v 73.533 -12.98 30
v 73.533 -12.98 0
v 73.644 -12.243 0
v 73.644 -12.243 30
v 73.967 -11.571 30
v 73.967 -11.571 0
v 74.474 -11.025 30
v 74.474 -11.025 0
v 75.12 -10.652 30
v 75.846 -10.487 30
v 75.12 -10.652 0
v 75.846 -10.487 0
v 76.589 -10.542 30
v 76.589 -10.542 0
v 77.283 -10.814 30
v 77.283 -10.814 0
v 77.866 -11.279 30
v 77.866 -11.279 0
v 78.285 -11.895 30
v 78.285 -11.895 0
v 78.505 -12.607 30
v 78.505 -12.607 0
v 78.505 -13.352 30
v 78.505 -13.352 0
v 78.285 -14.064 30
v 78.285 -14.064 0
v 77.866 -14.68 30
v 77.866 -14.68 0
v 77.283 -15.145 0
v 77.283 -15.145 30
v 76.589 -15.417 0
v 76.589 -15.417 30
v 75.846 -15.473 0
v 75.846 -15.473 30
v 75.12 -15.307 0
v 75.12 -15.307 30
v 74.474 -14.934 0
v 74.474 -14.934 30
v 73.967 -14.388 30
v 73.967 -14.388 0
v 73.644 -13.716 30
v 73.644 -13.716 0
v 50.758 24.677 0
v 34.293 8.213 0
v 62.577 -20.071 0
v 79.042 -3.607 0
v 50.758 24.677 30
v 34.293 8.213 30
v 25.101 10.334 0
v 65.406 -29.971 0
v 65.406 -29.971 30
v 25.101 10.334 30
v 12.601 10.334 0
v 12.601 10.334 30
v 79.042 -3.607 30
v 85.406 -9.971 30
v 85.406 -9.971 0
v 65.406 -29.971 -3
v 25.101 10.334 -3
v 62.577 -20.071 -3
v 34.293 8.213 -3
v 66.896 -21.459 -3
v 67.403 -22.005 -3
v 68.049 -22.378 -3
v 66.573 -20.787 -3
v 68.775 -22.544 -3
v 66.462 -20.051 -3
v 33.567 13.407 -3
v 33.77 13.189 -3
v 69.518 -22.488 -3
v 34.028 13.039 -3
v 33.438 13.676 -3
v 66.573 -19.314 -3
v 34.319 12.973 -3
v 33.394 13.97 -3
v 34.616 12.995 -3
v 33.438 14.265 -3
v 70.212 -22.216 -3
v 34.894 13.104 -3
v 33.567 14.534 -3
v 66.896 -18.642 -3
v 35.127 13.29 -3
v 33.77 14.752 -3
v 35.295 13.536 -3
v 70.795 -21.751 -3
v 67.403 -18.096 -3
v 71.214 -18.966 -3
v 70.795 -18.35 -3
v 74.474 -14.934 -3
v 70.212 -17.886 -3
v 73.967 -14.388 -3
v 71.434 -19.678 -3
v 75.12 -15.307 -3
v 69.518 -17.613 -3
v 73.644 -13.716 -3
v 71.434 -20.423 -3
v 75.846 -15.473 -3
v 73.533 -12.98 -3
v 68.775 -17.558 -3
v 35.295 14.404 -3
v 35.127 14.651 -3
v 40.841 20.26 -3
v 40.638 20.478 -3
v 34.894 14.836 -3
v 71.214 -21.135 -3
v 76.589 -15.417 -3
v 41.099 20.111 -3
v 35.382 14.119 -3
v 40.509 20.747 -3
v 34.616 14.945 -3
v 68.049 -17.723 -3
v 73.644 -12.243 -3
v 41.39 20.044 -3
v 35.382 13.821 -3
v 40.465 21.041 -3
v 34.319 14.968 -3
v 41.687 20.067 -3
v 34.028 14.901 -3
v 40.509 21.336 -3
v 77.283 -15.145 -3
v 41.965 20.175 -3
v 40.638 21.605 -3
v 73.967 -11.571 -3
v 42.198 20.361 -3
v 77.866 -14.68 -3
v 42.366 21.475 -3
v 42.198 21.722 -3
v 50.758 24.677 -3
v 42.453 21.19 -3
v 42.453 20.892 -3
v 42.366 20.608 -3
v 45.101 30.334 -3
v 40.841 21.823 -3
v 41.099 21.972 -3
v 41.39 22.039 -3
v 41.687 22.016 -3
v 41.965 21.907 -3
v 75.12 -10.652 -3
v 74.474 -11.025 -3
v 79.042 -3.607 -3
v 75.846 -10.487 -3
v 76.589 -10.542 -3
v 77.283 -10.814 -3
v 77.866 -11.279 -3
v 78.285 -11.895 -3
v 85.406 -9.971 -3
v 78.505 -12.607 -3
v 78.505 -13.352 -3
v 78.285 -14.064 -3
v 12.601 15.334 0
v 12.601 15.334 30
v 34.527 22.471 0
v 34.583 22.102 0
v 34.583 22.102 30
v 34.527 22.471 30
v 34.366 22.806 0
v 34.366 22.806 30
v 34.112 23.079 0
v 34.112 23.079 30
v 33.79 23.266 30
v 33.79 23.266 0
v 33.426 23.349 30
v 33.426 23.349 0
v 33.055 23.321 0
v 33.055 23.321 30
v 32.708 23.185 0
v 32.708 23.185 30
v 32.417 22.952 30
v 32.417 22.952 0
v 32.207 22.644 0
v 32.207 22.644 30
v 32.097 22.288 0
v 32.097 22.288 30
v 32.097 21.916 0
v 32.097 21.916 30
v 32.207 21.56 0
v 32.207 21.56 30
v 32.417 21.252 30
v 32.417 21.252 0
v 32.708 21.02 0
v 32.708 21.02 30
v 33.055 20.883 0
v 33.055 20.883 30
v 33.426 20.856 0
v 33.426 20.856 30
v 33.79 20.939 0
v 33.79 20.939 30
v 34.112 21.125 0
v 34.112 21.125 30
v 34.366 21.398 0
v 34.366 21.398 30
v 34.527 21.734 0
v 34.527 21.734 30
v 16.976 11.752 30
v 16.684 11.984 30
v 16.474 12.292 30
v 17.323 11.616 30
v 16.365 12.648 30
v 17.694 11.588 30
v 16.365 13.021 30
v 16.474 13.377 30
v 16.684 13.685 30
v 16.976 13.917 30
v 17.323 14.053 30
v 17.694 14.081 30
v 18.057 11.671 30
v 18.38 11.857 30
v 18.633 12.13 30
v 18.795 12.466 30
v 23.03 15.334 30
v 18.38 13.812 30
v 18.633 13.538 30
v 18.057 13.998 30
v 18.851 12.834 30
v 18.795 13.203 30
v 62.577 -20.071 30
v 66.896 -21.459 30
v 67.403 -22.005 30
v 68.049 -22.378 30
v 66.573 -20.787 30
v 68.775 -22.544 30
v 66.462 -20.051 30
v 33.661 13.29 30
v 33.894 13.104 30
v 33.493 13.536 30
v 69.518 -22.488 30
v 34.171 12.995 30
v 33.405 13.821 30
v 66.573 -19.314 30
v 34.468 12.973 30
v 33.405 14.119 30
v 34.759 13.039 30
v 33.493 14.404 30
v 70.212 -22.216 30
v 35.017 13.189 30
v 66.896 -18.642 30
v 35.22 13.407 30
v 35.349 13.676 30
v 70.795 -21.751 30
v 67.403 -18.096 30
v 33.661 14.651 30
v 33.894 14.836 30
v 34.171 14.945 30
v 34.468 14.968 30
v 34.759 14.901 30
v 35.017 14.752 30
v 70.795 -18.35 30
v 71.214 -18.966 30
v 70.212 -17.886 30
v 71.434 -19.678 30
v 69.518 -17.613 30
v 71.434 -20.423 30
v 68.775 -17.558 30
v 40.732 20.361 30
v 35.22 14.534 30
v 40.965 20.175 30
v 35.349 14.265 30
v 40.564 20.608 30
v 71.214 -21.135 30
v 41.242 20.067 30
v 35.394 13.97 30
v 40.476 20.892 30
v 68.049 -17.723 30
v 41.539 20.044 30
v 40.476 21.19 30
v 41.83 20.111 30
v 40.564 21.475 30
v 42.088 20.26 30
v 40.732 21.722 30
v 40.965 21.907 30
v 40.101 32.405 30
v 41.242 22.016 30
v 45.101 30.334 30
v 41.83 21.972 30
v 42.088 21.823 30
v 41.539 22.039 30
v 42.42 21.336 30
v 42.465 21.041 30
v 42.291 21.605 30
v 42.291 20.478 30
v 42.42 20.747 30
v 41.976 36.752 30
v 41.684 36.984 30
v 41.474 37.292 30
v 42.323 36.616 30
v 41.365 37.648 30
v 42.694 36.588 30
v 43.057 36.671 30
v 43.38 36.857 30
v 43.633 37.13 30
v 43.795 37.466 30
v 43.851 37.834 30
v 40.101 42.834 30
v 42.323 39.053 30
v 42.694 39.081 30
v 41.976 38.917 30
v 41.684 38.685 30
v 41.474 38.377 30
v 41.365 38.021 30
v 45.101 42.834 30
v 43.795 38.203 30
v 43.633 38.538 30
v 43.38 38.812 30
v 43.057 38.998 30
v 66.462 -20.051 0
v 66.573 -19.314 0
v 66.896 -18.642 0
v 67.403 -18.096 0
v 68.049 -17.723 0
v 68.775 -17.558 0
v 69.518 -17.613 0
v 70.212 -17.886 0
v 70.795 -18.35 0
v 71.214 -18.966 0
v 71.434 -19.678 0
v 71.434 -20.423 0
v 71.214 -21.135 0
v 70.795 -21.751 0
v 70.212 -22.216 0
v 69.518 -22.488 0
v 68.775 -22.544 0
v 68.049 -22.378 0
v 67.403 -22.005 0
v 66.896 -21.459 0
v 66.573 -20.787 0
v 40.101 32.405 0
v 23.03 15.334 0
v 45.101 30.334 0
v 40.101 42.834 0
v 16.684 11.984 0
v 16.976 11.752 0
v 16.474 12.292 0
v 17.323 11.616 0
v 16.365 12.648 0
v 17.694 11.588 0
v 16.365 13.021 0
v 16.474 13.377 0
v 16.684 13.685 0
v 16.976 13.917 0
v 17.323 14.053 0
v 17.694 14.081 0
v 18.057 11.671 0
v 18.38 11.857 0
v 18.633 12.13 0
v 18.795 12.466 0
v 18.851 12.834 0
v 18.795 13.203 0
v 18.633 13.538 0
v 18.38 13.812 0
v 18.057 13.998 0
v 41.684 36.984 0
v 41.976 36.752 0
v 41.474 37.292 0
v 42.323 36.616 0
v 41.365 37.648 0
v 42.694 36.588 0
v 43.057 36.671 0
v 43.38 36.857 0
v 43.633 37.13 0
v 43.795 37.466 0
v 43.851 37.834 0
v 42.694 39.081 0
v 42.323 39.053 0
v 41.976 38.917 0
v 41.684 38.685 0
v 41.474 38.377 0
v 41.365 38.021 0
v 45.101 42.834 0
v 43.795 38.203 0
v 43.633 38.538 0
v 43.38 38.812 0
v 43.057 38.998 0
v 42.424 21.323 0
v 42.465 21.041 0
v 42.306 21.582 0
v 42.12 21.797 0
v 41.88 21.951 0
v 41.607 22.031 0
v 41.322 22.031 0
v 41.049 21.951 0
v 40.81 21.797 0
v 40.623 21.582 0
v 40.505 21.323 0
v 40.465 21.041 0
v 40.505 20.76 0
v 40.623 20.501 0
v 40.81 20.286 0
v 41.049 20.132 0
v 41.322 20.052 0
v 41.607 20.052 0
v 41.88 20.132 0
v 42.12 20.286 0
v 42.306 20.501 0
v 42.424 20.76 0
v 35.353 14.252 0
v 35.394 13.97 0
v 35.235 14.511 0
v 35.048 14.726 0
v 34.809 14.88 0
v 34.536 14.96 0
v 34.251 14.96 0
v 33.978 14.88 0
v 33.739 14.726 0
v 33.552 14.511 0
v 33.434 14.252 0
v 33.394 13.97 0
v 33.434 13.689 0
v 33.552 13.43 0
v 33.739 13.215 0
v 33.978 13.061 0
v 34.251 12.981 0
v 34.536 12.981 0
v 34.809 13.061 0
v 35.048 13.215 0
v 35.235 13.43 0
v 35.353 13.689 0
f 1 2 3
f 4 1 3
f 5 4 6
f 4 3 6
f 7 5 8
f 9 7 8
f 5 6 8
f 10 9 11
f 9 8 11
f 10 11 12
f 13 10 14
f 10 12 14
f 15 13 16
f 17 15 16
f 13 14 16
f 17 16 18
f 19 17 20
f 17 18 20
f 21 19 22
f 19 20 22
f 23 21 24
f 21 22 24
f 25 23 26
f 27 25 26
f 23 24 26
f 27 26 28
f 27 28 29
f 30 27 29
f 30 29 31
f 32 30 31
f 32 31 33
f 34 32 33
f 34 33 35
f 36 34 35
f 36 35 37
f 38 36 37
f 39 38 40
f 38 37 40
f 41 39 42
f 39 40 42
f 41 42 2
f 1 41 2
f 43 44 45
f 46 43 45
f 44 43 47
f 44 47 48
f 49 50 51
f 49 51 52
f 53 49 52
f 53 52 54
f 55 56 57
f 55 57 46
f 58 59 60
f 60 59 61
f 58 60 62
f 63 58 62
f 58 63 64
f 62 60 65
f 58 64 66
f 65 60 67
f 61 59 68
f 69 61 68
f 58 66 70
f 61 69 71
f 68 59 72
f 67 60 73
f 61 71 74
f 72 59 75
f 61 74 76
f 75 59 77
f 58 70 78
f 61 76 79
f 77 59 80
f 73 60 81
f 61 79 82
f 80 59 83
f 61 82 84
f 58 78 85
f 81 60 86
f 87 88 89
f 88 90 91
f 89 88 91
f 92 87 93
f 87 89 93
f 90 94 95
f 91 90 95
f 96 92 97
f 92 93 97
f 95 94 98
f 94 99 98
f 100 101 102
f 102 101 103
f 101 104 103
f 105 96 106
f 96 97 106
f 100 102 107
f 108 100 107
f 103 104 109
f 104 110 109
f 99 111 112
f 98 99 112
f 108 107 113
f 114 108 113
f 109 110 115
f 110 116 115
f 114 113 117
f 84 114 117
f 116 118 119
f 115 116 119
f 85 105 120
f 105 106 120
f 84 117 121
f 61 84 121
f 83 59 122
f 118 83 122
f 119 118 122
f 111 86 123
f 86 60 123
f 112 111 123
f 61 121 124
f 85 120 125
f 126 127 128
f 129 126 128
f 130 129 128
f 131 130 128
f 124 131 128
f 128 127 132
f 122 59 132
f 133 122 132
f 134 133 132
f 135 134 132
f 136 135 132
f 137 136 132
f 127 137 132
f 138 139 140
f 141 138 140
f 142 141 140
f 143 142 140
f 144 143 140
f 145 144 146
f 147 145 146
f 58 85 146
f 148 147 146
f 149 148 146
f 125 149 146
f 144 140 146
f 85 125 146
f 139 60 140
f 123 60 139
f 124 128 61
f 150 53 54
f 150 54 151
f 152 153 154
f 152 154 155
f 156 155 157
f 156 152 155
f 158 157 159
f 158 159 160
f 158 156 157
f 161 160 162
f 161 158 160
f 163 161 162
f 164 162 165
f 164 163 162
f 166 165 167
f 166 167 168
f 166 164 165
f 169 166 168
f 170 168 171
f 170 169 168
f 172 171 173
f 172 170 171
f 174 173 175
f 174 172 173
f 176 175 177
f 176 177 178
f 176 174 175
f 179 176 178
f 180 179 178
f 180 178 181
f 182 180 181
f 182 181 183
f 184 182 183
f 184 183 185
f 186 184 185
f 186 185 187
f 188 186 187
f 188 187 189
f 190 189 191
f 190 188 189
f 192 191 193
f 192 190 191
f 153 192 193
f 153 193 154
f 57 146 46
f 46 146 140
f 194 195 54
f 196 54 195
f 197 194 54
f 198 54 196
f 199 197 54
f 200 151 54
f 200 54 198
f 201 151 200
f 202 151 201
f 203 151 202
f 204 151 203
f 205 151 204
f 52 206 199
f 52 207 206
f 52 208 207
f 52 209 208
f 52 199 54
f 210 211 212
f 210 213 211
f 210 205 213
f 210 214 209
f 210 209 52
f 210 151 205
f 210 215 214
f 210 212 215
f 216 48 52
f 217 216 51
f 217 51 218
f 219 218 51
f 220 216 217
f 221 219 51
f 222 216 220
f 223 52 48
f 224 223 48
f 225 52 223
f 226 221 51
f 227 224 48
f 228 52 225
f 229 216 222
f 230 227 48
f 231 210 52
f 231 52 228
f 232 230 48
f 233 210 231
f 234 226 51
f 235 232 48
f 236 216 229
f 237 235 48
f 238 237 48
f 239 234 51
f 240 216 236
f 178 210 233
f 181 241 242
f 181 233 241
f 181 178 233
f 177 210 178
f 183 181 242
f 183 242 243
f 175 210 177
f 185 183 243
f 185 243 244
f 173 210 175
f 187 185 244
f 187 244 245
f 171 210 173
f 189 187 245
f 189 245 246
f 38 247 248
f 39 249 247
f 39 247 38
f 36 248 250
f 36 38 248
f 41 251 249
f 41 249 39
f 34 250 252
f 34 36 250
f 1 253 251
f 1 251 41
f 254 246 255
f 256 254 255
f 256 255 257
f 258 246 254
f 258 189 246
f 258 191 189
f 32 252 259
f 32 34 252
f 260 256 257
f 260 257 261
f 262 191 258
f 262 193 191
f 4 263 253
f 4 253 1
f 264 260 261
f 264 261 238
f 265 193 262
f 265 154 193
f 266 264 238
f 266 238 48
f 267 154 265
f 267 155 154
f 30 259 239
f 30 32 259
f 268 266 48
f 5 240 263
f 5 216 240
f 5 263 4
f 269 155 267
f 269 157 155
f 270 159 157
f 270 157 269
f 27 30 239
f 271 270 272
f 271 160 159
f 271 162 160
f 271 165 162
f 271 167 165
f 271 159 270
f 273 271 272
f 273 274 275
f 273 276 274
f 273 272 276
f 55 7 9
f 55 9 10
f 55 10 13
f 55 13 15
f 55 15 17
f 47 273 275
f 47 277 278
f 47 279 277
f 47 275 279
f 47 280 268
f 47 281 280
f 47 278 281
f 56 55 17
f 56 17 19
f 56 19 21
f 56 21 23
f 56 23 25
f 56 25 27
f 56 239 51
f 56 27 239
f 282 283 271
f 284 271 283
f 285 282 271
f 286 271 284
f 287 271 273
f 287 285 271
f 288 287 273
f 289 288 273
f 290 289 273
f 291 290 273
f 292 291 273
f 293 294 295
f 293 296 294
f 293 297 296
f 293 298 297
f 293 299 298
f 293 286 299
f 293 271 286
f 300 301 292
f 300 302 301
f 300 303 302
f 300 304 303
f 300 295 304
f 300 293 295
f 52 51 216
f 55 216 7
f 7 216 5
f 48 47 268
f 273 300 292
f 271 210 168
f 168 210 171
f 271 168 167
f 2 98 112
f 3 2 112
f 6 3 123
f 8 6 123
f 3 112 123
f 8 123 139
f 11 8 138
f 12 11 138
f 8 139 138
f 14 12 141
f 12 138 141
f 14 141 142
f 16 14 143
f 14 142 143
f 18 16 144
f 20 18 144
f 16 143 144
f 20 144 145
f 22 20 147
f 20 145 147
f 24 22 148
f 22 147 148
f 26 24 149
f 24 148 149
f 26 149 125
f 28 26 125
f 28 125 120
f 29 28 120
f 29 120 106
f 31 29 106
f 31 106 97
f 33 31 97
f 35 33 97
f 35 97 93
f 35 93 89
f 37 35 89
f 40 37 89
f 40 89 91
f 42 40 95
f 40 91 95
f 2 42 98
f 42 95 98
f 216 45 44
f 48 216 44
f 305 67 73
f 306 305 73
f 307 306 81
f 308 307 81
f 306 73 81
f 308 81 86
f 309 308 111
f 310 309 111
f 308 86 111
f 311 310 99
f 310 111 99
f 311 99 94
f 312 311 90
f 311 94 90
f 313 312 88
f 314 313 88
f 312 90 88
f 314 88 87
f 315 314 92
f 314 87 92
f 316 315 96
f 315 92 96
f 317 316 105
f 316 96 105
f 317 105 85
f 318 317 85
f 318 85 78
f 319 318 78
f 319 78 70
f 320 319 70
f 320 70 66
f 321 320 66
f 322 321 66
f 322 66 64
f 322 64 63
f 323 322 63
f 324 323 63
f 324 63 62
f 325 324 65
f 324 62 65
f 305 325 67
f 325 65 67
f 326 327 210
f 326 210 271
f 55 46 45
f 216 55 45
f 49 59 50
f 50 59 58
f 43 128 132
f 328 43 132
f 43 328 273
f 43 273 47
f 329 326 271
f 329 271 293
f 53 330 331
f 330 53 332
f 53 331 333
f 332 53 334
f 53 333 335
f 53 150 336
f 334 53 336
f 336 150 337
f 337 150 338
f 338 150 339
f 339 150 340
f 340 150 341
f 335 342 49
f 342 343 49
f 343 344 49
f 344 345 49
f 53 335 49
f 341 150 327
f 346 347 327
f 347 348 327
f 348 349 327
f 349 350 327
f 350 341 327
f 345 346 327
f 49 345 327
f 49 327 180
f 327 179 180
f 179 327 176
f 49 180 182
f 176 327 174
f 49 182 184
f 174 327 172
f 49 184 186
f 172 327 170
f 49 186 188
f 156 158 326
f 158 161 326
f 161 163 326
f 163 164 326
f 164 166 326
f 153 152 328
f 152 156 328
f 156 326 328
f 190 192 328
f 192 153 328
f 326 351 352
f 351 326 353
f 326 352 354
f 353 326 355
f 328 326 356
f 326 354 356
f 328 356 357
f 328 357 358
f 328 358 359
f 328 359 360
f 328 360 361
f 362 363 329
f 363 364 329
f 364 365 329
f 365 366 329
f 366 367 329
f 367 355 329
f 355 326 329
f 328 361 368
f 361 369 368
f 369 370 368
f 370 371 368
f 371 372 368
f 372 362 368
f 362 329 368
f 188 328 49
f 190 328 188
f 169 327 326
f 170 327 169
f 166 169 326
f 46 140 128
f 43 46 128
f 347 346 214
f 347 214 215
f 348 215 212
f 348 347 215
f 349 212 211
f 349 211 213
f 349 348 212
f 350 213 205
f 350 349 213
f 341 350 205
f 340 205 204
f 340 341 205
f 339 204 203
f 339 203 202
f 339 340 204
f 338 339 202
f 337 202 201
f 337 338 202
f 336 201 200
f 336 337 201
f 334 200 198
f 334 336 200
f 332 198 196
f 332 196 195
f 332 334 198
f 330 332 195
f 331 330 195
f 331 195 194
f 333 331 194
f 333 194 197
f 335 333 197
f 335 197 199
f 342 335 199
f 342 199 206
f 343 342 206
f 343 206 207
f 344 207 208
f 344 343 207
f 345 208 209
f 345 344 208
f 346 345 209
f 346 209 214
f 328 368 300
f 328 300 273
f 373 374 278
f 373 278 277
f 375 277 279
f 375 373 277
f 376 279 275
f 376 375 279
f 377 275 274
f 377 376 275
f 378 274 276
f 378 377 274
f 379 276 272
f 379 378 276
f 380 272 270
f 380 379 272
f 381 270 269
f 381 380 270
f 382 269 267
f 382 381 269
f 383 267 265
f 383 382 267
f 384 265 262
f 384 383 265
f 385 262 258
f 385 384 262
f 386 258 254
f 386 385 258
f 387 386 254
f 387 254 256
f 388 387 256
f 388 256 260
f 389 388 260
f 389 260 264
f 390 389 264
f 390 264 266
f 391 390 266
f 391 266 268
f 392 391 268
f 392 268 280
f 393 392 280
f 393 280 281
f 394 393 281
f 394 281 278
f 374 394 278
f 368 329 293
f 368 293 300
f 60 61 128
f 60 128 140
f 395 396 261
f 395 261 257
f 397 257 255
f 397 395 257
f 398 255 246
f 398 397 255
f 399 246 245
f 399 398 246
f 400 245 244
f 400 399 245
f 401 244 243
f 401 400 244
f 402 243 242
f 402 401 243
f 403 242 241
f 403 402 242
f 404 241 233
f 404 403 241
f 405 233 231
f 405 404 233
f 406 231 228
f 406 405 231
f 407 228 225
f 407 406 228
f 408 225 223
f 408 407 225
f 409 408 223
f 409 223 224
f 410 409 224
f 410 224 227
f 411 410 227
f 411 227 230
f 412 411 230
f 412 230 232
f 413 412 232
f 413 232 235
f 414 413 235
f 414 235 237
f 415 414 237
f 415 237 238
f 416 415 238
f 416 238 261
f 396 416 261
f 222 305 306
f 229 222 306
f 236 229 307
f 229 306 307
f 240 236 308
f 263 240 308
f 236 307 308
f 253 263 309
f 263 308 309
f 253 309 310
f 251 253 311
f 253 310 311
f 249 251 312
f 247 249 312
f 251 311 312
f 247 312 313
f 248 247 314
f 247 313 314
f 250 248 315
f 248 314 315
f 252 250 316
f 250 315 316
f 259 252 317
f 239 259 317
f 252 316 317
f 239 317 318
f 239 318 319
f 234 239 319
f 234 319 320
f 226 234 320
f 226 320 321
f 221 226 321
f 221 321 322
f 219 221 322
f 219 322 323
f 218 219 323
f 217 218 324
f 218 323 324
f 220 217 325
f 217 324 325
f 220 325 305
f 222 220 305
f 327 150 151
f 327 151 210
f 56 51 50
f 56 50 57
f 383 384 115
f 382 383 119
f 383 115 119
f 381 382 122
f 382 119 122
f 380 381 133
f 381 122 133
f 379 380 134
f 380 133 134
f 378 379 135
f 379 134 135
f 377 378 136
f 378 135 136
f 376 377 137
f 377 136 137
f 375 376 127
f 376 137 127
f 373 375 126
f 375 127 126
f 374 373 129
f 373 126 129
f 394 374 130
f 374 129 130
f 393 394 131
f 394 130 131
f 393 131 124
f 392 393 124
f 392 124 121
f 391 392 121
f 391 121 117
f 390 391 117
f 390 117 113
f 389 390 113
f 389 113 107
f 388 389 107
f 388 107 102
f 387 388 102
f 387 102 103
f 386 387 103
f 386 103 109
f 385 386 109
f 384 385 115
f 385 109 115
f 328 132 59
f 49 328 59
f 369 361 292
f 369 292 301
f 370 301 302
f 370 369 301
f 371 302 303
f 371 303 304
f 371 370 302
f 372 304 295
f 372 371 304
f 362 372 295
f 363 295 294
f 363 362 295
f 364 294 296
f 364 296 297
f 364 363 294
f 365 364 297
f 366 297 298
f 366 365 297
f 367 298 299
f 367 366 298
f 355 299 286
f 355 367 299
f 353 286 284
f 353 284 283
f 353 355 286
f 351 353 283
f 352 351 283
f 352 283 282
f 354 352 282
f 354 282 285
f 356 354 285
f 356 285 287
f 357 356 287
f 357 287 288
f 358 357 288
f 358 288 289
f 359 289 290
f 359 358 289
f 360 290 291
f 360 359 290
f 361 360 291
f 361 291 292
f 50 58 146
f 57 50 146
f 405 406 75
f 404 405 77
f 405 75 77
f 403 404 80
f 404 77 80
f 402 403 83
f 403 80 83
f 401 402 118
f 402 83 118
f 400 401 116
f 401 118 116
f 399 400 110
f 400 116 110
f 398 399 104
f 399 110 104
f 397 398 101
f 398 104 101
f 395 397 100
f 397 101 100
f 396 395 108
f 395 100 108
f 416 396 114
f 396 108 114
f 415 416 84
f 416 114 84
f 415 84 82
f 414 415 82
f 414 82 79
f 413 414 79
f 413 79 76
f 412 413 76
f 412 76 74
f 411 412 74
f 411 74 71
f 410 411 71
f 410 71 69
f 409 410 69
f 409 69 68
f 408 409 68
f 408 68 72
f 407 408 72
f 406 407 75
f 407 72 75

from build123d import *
from build123d.topology import SkipClean

# Parameters (mm, degrees)
MODEL_R             = 1
MODEL_R_2           = 1.25
BOSS_EXTRUDE1_DEPTH = 30
SKETCH3_R           = 2.5
BOSS_EXTRUDE2_DEPTH = 30
BOSS_EXTRUDE5_START = 3
SKETCH7_R           = 2.5
SKETCH7_R_2         = 1
BOSS_EXTRUDE5_DEPTH = 3
BOSS_EXTRUDE6_DEPTH = 3


with BuildPart() as part:
    # Model → Boss-Extrude1 (new body)
    # profile 1 of 2: a face of its own
    with BuildSketch(Plane.XY):
        Polygon((25.100694962, 10.3343272), (45.100694962, 30.3343272), (50.757549212, 24.67747295), (30.757549212, 4.67747295), align=None)
        with Locations((41.464655993, 21.041433981)):
            Circle(MODEL_R, mode=Mode.SUBTRACT)
        with Locations((34.393588181, 13.970366169)):
            Circle(MODEL_R, mode=Mode.SUBTRACT)
    # profile 2 of 2: a face of its own
    with BuildSketch(Plane.XY):
        Polygon((40.100694962, 42.8343272), (45.100694962, 42.8343272), (45.100694962, 30.3343272), (25.100694962, 10.3343272), (12.600694962, 10.3343272), (12.600694962, 15.3343272), (23.02962715, 15.3343272), (40.100694962, 32.405395011), align=None)
        with Locations((33.332928009, 22.102094153)):
            Circle(MODEL_R_2, mode=Mode.SUBTRACT)
        with Locations((42.600694962, 37.8343272)):
            Circle(MODEL_R_2, mode=Mode.SUBTRACT)
        with Locations((17.600694962, 12.8343272)):
            Circle(MODEL_R_2, mode=Mode.SUBTRACT)
    extrude(amount=BOSS_EXTRUDE1_DEPTH)

    # Sketch3 → Boss-Extrude2 (add)
    with BuildSketch(Plane(origin=(0, 0, 0), x_dir=(-1, 0, 0), z_dir=(0, 0, -1))):
        Polygon((-30.757549212, 4.67747295), (-59.041820459, -23.606798297), (-65.40578149, -29.970759328), (-85.40578149, -9.970759328), (-79.041820459, -3.606798297), (-62.577354365, -20.071264391), (-34.293083118, 8.213006856), align=None)
        with Locations((-76.033069792, -12.979509995)):
            Circle(SKETCH3_R, mode=Mode.SUBTRACT)
        with Locations((-68.96200198, -20.050577807)):
            Circle(SKETCH3_R, mode=Mode.SUBTRACT)
    extrude(amount=-BOSS_EXTRUDE2_DEPTH)

    # Sketch7 → Boss-Extrude5 (add)
    with SkipClean():  # the faces are left unmerged after this step: merging them gives an invalid solid
        with BuildSketch(Plane(origin=(0, 0, 0), x_dir=(-1, 0, 0), z_dir=(0, 0, -1)).offset(BOSS_EXTRUDE5_START)):
            Polygon((-45.100694962, 30.3343272), (-25.100694962, 10.3343272), (-65.40578149, -29.970759328), (-85.40578149, -9.970759328), (-79.041820459, -3.606798297), (-62.577354365, -20.071264391), (-34.293083118, 8.213006856), (-50.757549212, 24.67747295), align=None)
            with Locations((-68.96200198, -20.050577807)):
                Circle(SKETCH7_R, mode=Mode.SUBTRACT)
            with Locations((-76.033069792, -12.979509995)):
                Circle(SKETCH7_R, mode=Mode.SUBTRACT)
            with Locations((-34.393588181, 13.970366169)):
                Circle(SKETCH7_R_2, mode=Mode.SUBTRACT)
            with Locations((-41.464655993, 21.041433981)):
                Circle(SKETCH7_R_2, mode=Mode.SUBTRACT)
        extrude(amount=-BOSS_EXTRUDE5_DEPTH)

    # Sketch8 → Boss-Extrude6 (add)
    with SkipClean():  # the faces are left unmerged after this step: merging them gives an invalid solid
        with BuildSketch(Plane(origin=(0, 0, -3), x_dir=(-1, 0, 0), z_dir=(0, 0, -1))):
            Polygon((-50.757549212, 24.67747295), (-34.293083118, 8.213006856), (-62.577354365, -20.071264391), (-79.041820459, -3.606798297), align=None)
        extrude(amount=-BOSS_EXTRUDE6_DEPTH)


solid = part.part
